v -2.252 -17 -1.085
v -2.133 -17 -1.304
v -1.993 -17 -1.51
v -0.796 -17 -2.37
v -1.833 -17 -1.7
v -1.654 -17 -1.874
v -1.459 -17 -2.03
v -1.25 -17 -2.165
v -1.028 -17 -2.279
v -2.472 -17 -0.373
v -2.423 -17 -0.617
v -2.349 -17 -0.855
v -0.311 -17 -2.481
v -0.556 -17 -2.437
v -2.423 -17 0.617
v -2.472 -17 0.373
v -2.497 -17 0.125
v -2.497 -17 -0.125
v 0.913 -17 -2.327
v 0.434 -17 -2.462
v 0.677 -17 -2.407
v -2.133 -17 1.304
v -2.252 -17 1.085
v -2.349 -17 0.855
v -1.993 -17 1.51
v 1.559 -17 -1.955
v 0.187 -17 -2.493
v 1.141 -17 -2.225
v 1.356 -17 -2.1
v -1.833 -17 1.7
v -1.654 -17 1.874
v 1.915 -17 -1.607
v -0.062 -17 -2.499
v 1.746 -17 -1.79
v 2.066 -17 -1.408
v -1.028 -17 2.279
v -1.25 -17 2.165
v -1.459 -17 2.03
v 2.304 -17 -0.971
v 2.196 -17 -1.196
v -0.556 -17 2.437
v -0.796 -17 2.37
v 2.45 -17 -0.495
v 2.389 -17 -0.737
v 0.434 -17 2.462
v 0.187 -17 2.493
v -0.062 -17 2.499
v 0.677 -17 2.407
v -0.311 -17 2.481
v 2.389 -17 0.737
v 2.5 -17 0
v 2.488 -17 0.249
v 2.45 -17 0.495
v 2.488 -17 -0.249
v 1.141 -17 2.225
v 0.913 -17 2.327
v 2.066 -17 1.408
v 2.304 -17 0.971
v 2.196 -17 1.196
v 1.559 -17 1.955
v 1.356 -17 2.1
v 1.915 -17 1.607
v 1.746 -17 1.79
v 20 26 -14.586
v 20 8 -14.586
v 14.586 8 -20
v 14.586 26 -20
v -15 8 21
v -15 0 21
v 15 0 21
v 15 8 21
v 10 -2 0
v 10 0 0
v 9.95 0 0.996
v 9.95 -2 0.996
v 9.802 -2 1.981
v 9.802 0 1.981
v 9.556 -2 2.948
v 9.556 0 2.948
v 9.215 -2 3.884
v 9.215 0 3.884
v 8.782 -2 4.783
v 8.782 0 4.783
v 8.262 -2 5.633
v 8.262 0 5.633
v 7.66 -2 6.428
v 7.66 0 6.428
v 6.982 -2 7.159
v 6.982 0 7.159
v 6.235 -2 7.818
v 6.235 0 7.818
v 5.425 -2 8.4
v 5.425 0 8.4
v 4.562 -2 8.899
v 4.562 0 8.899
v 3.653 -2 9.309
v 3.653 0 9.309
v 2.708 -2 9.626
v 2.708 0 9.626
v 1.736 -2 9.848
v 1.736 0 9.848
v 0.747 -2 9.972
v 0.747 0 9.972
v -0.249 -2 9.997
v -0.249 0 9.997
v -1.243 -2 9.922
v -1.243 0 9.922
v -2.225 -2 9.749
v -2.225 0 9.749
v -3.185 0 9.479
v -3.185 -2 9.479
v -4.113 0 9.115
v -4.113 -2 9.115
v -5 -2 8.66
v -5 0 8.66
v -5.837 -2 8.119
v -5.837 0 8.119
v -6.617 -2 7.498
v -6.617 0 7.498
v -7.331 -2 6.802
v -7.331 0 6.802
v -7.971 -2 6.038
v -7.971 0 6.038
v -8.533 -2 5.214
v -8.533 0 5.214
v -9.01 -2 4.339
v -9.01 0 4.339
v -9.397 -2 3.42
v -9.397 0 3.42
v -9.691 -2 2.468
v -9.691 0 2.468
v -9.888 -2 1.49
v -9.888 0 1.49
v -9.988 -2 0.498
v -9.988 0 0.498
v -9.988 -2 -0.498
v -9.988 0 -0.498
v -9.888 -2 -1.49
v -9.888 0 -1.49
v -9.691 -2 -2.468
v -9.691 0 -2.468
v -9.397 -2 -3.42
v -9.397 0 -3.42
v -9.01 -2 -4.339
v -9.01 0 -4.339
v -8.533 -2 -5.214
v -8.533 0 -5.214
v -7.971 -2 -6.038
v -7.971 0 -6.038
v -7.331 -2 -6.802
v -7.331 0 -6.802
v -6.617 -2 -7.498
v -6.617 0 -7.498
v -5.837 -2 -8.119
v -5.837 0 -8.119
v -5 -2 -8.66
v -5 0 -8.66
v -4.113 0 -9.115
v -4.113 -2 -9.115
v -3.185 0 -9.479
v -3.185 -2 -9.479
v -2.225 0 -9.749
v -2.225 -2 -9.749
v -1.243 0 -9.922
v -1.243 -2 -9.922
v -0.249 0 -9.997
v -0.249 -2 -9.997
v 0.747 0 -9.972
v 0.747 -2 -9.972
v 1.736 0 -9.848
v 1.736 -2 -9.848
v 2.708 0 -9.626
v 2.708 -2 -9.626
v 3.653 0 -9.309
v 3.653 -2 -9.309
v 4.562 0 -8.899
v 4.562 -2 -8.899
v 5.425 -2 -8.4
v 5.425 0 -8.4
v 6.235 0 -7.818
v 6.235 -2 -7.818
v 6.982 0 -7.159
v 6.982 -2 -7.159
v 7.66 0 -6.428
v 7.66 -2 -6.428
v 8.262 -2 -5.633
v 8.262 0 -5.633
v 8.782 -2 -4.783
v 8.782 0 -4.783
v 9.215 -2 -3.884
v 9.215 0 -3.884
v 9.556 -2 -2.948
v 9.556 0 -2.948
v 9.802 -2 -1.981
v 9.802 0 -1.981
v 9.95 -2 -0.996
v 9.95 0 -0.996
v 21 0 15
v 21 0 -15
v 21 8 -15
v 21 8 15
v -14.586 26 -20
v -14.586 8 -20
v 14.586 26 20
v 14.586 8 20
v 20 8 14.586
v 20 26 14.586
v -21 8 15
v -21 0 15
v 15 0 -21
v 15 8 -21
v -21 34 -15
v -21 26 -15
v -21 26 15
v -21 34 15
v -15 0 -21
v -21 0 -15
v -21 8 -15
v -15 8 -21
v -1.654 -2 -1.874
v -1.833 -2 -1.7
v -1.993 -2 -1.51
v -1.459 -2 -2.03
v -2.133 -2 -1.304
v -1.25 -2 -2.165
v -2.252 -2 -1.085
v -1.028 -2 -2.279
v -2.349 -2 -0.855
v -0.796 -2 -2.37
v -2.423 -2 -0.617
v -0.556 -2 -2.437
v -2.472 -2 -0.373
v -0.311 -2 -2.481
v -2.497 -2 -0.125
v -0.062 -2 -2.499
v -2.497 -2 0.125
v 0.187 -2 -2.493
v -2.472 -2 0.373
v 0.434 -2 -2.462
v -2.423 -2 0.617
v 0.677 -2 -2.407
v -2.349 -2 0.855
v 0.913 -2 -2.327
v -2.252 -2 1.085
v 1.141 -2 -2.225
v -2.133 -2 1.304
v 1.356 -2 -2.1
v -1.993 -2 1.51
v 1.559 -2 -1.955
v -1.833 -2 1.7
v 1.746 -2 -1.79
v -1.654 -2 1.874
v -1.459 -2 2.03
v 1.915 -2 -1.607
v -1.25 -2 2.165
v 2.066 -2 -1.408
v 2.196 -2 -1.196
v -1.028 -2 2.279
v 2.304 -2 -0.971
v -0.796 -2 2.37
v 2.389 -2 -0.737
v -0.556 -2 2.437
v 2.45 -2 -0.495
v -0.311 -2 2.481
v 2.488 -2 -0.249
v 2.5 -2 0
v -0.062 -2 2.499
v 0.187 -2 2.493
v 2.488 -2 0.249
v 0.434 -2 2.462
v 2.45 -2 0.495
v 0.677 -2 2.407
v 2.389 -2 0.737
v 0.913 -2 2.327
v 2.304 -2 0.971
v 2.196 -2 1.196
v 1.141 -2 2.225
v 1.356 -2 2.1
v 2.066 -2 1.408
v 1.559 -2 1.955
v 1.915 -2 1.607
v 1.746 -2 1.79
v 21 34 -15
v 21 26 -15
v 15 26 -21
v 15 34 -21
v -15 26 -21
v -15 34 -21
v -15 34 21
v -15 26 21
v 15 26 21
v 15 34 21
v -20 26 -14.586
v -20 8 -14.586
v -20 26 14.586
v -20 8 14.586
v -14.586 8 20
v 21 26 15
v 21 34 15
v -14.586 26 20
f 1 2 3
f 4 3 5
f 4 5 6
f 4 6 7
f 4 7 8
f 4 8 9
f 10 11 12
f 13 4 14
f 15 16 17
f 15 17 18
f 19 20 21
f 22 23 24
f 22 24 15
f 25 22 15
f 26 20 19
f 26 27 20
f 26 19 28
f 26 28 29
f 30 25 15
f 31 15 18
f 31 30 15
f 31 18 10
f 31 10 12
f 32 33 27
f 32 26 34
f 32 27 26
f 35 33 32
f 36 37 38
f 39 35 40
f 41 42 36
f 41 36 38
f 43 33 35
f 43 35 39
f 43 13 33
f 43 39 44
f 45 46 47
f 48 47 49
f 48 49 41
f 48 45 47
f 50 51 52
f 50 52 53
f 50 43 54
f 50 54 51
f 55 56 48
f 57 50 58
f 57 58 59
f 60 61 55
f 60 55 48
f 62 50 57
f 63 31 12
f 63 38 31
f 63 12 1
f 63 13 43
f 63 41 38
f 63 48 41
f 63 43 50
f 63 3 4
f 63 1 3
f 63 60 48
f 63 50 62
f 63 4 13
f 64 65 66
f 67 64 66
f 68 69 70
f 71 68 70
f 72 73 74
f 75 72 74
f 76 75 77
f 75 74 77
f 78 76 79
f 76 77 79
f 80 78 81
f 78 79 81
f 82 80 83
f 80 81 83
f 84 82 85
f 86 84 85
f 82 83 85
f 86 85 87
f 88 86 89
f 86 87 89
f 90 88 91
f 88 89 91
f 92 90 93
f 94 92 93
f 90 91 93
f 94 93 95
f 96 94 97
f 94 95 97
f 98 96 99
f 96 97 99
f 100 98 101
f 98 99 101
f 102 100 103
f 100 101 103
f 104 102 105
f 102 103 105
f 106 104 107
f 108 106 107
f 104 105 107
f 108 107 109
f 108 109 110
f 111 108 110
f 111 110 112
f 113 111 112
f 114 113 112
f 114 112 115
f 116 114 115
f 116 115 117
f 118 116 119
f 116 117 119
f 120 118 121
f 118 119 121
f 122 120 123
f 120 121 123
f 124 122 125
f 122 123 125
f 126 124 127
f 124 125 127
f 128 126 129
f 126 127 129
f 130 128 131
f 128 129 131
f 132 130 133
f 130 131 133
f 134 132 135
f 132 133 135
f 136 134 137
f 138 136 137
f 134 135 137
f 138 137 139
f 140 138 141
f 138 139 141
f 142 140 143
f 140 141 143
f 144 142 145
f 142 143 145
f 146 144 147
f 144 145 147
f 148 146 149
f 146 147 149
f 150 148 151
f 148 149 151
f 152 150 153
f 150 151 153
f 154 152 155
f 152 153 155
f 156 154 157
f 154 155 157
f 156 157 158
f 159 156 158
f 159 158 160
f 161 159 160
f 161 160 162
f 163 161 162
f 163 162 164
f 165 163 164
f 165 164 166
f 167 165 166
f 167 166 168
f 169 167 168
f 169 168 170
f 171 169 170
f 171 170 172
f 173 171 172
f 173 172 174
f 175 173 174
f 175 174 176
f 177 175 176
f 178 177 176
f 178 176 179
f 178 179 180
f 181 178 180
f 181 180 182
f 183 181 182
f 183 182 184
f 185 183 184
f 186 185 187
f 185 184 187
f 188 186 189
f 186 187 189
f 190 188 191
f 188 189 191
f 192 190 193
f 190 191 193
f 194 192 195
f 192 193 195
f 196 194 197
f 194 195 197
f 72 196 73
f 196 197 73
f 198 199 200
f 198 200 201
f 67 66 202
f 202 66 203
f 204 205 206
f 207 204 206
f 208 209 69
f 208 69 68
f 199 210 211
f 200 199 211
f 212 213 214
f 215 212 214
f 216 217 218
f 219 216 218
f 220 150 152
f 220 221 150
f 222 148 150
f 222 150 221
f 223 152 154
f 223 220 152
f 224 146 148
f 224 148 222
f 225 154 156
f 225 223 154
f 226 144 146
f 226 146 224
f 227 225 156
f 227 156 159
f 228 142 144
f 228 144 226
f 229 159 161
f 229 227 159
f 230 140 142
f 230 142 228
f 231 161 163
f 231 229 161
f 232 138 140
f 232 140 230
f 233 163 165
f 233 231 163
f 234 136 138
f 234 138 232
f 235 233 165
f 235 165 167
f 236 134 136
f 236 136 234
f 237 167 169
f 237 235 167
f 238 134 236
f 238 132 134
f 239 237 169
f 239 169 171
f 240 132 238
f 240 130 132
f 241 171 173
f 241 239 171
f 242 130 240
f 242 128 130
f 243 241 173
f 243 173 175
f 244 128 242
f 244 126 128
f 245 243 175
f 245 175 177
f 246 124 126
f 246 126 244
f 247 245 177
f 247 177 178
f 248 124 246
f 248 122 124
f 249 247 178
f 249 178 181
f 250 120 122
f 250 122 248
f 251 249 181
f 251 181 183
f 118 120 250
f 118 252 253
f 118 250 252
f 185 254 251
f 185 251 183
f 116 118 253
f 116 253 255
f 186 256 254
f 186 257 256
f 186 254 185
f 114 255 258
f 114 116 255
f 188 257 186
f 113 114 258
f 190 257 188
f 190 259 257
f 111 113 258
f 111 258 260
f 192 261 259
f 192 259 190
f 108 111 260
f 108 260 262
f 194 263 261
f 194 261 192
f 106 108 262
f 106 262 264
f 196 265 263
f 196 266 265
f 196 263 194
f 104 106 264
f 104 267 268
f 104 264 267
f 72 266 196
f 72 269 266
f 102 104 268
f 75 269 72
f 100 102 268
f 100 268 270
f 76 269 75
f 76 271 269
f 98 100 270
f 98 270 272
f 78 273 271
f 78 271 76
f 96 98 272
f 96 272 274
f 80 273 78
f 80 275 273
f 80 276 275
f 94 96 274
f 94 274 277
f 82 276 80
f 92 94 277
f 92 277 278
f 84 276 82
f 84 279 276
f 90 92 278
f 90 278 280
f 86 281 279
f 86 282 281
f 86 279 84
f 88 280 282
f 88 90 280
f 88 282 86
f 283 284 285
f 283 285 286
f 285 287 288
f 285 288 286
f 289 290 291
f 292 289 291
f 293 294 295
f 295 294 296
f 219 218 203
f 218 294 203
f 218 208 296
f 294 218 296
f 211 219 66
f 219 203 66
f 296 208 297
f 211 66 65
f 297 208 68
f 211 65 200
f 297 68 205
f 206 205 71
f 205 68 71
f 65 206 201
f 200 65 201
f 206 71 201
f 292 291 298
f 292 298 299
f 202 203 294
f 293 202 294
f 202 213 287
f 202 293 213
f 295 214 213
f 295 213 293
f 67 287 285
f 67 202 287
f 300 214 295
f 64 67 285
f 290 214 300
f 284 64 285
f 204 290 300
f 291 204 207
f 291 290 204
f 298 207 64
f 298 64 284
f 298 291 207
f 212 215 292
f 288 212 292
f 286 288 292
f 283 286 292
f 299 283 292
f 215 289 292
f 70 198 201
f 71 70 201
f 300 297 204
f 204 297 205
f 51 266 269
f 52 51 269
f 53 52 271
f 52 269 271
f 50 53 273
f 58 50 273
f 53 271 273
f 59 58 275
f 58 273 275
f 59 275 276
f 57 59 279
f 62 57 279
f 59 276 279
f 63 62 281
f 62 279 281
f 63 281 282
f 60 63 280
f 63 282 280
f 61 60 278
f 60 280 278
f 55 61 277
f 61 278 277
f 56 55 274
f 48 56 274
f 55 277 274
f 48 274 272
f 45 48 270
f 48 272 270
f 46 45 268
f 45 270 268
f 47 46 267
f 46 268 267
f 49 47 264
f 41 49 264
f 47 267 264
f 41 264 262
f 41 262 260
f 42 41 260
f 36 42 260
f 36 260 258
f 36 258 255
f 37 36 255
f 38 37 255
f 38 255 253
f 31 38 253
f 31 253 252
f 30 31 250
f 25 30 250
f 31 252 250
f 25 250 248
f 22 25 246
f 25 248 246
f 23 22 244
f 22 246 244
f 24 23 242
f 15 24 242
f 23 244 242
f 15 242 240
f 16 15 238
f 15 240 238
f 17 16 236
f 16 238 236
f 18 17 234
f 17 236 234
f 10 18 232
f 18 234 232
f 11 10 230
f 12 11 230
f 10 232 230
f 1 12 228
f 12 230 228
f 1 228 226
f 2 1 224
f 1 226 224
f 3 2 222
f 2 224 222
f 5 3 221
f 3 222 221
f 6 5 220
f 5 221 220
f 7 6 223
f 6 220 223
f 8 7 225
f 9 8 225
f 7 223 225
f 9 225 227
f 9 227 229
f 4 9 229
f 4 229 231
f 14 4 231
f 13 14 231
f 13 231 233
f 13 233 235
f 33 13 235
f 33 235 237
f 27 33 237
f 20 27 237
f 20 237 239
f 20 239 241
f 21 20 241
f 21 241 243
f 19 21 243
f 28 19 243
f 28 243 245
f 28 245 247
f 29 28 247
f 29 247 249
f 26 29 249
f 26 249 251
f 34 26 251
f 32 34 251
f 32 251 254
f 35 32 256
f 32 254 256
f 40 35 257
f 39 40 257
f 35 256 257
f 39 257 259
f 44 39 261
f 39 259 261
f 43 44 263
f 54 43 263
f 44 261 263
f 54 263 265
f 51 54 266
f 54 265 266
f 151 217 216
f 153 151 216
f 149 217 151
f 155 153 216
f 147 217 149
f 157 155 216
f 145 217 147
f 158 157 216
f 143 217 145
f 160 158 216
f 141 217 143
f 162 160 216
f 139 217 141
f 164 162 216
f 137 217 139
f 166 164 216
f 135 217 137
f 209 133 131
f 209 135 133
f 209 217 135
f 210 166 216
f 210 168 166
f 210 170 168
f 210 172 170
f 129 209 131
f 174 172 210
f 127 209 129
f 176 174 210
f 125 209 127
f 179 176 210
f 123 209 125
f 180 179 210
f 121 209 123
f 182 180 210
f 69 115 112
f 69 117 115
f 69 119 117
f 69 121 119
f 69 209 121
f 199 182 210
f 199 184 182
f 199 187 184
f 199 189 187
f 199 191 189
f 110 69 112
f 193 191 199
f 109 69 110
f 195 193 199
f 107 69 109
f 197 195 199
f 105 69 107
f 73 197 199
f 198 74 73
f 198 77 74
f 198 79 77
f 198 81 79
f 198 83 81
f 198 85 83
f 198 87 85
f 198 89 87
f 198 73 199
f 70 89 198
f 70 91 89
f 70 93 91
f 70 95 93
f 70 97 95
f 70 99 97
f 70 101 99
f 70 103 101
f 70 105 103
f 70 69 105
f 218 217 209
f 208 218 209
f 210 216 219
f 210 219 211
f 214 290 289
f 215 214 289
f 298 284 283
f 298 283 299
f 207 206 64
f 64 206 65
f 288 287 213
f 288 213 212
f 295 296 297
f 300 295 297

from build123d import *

# Parameters (mm, degrees)
F0_W     = 42
F0_H     = 42
F1_DEPTH = 34
F2_SIZE  = 6
F5_DEPTH = 18
F6_R     = 10
F7_DEPTH = 2
F8_R     = 2.5
F9_DEPTH = 15


with BuildPart() as f1:
    # F0 (on Front) → F1 (new body)
    with BuildSketch(Plane.XZ):
        Rectangle(F0_W, F0_H)
    extrude(amount=-F1_DEPTH)

    # F2
    f2_edges = [f1.edges().sort_by_distance(p)[0] for p in [
        (21, 17, 21),
        (-21, 17, 21),
        (21, 17, -21),
        (-21, 17, -21),
    ]]
    chamfer(f2_edges, length=F2_SIZE)

    # F4 (on offset) → F5 (cut)
    with BuildSketch(Plane.XZ.offset(-8)):
        Polygon((15, 21), (-15, 21), (-21, 15), (-21, -15), (-15, -21), (15, -21), (21, -15), (21, 15), align=None)
        Polygon((-20, 14.585786), (-14.585786, 20), (14.585786, 20), (20, 14.585786), (20, -14.585786), (14.585786, -20), (-14.585786, -20), (-20, -14.585786), align=None, mode=Mode.SUBTRACT)
    extrude(amount=-F5_DEPTH, mode=Mode.SUBTRACT)

    # F6 (on Front) → F7 (join)
    with BuildSketch(Plane.XZ):
        Circle(F6_R)
    extrude(amount=F7_DEPTH)

    # F8 (on face) → F9 (join)
    with BuildSketch(Plane.XZ.offset(2)):
        Circle(F8_R)
    extrude(amount=F9_DEPTH)


solid = f1.part
